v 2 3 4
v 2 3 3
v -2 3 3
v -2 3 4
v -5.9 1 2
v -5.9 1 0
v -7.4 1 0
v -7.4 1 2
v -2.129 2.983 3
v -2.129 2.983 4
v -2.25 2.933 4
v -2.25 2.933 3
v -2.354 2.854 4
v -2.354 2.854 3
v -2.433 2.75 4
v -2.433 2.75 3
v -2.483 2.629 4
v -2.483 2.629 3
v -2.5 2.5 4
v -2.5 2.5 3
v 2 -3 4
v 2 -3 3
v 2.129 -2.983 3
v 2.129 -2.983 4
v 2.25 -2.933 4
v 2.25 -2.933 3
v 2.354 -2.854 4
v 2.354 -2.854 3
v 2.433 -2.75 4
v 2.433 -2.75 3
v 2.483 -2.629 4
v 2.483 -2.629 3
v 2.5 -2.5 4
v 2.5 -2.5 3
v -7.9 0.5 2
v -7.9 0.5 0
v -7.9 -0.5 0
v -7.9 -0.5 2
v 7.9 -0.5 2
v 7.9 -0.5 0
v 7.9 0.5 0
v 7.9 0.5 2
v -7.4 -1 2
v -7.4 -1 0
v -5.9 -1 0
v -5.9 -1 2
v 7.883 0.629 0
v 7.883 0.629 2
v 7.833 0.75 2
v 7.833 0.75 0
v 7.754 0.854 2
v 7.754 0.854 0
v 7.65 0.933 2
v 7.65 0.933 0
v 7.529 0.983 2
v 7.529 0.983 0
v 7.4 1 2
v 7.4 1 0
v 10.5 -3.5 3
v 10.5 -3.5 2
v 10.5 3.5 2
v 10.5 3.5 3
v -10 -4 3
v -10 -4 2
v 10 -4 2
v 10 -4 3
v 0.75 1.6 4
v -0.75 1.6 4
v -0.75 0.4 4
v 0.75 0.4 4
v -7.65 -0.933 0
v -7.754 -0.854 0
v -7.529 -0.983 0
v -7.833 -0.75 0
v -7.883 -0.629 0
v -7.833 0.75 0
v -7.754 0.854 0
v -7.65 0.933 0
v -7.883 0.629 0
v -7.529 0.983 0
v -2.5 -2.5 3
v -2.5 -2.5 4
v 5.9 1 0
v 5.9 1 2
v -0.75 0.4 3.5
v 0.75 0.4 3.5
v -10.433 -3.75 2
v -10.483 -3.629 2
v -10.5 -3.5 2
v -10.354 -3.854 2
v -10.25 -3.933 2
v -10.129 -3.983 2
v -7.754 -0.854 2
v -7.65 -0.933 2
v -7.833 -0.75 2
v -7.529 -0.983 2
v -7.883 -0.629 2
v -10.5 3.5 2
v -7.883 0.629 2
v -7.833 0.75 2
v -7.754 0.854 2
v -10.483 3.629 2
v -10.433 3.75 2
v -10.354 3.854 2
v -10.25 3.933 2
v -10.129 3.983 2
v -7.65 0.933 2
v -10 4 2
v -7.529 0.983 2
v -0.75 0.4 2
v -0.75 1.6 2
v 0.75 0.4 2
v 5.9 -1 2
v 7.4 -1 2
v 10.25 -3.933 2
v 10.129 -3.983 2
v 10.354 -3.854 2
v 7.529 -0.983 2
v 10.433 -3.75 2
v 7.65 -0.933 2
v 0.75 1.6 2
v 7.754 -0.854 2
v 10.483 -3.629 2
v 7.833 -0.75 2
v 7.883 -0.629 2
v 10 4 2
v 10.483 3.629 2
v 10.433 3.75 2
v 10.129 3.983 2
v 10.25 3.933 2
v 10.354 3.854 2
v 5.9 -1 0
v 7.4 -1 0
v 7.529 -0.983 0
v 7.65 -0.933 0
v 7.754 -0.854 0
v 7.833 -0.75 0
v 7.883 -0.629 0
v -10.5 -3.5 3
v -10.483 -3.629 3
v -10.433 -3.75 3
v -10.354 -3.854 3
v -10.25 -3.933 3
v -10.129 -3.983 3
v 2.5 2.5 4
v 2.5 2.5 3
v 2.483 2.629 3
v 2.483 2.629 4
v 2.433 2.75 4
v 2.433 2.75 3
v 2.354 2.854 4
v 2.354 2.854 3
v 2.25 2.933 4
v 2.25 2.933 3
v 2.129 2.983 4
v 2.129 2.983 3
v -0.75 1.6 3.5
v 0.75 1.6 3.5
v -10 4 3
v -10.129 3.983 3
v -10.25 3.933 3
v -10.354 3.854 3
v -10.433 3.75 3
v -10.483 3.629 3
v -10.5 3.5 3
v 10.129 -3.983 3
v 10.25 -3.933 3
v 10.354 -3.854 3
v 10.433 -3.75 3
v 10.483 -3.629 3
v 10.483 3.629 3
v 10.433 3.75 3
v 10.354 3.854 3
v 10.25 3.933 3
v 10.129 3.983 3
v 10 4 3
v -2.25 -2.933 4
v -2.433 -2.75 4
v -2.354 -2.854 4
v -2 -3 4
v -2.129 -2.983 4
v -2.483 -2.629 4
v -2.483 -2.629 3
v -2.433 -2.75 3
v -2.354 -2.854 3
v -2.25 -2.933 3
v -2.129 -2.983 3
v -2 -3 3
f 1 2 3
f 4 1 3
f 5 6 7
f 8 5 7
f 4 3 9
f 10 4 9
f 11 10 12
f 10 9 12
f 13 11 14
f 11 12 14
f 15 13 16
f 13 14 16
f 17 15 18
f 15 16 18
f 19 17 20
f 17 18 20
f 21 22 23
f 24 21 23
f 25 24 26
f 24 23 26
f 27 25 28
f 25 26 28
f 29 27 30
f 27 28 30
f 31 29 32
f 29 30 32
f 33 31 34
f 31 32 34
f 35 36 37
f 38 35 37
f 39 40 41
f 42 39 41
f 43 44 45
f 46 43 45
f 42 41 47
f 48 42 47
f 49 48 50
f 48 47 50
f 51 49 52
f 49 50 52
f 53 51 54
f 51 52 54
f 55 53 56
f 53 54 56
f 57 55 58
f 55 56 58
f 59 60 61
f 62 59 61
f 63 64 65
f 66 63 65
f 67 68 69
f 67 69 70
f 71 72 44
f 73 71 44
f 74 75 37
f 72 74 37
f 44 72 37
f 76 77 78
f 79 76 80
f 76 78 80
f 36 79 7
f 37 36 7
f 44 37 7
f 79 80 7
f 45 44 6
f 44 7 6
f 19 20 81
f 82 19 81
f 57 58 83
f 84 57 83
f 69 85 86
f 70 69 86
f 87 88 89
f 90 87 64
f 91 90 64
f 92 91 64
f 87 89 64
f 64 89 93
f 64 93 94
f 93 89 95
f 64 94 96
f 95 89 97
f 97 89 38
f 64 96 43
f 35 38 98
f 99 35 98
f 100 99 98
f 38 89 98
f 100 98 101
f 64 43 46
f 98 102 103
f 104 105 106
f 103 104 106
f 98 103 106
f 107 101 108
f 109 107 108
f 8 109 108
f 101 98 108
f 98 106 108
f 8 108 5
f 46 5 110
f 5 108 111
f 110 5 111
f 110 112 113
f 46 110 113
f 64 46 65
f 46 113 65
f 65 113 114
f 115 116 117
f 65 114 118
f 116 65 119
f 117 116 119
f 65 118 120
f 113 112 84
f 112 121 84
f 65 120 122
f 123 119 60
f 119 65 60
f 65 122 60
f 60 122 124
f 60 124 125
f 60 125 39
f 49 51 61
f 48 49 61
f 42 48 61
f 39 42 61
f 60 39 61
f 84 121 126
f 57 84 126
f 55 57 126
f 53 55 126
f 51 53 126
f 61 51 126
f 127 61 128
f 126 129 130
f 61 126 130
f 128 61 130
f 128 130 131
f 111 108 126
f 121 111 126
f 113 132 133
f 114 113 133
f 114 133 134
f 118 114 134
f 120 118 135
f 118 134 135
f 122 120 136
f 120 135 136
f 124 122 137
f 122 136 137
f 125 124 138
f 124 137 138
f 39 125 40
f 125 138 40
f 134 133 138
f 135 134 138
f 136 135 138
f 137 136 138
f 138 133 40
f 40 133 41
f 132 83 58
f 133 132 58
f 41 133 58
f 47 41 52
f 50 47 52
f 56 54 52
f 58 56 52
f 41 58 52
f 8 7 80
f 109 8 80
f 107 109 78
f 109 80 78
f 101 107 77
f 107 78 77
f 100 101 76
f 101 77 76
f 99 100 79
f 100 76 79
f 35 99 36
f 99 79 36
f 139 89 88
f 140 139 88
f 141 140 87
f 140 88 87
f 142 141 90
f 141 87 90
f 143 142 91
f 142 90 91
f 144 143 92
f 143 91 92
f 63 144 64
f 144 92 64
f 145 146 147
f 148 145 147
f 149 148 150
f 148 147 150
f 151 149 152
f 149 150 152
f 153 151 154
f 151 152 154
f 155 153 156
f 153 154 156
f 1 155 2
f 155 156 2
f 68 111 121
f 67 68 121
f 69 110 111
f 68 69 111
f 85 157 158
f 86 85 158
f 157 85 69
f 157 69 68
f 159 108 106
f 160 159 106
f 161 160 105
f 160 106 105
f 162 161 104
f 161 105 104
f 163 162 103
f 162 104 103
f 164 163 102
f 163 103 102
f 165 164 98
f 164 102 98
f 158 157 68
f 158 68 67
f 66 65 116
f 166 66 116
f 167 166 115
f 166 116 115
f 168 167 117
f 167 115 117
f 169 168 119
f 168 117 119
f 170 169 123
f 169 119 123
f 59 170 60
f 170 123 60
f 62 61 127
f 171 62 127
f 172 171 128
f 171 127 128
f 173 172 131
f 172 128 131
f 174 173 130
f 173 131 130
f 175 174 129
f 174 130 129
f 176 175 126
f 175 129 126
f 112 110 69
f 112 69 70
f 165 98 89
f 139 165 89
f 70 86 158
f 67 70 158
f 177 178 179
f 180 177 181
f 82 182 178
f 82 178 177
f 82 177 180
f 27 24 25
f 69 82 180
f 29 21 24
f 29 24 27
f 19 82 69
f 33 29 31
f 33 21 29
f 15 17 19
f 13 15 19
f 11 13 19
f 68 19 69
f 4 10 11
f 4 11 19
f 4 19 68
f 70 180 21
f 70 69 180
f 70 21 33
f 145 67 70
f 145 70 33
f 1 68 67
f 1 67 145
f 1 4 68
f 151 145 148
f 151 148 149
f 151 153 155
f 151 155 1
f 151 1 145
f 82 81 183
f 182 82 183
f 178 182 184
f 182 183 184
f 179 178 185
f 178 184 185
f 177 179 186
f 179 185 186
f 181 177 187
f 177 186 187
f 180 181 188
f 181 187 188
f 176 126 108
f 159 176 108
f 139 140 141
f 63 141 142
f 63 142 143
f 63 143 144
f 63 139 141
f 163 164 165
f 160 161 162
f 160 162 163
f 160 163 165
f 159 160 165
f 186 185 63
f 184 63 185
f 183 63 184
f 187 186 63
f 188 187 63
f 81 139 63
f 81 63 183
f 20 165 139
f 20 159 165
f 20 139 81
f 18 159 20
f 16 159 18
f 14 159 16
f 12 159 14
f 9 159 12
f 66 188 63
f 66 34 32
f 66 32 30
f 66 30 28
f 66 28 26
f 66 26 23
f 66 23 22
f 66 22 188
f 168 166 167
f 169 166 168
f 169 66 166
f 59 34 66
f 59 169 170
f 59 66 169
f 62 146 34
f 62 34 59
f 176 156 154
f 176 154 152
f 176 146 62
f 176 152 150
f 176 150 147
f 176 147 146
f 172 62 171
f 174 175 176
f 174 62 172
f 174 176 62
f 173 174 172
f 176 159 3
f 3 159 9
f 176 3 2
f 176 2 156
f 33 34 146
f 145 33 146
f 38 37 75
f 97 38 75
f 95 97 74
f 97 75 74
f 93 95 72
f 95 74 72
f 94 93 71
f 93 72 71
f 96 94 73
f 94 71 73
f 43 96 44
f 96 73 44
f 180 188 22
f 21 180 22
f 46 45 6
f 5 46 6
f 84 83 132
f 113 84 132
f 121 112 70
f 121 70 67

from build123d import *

# Parameters (mm, degrees)
F1_START = 2
F1_DEPTH = 1
F2_DEPTH = 3
F3_START = 2
F0_W     = 1.5
F0_H     = 1.2
F3_DEPTH = 2
F4_START = 3.5
F4_DEPTH = 0.5


# Not quite as in the source:
# - a feature names something its author has since deleted; it is built from what else it names


with BuildPart() as f1:
    # F0 (on Top) → F1 (new body)
    with BuildSketch(Plane.XY.offset(F1_START)):
        with BuildLine():
            Line((10, 4), (-10, 4))
            ThreePointArc((-10, 4), (-10.3535533906, 3.8535533906), (-10.5, 3.5))
            Line((-10.5, 3.5), (-10.5, -3.5))
            ThreePointArc((-10.5, -3.5), (-10.3535533906, -3.8535533906), (-10, -4))
            Line((-10, -4), (10, -4))
            ThreePointArc((10, -4), (10.3535533906, -3.8535533906), (10.5, -3.5))
            Line((10.5, -3.5), (10.5, 3.5))
            ThreePointArc((10.5, 3.5), (10.3535533906, 3.8535533906), (10, 4))
        make_face()
        with BuildLine():
            ThreePointArc((-7.9, 0.5), (-7.7535533906, 0.8535533906), (-7.4, 1))
            Line((-7.4, 1), (-5.9, 1))
            Line((-5.9, 1), (-5.9, -1))
            Line((-5.9, -1), (-7.4, -1))
            ThreePointArc((-7.4, -1), (-7.7535533906, -0.8535533906), (-7.9, -0.5))
            Line((-7.9, -0.5), (-7.9, 0.5))
        make_face(mode=Mode.SUBTRACT)
        with BuildLine():
            Line((-2, 3), (2, 3))
            ThreePointArc((2, 3), (2.3535533906, 2.8535533906), (2.5, 2.5))
            Line((2.5, 2.5), (2.5, -2.5))
            ThreePointArc((2.5, -2.5), (2.3535533906, -2.8535533906), (2, -3))
            Line((2, -3), (-2, -3))
            ThreePointArc((-2, -3), (-2.3535533906, -2.8535533906), (-2.5, -2.5))
            Line((-2.5, -2.5), (-2.5, 2.5))
            ThreePointArc((-2.5, 2.5), (-2.3535533906, 2.8535533906), (-2, 3))
        make_face(mode=Mode.SUBTRACT)
        with BuildLine():
            Line((5.9, -1), (5.9, 1))
            Line((5.9, 1), (7.4, 1))
            ThreePointArc((7.4, 1), (7.7535533906, 0.8535533906), (7.9, 0.5))
            Line((7.9, 0.5), (7.9, -0.5))
            ThreePointArc((7.9, -0.5), (7.7535533906, -0.8535533906), (7.4, -1))
            Line((7.4, -1), (5.9, -1))
        make_face(mode=Mode.SUBTRACT)
    extrude(amount=F1_DEPTH)

    # F0 (on Top) → F2 (join)
    with BuildSketch(Plane.XY):
        with BuildLine():
            Line((-5.9, 1), (-7.4, 1))
            ThreePointArc((-7.4, 1), (-7.7535533906, 0.8535533906), (-7.9, 0.5))
            Line((-7.9, 0.5), (-7.9, -0.5))
            ThreePointArc((-7.9, -0.5), (-7.7535533906, -0.8535533906), (-7.4, -1))
            Line((-7.4, -1), (-5.9, -1))
            Line((-5.9, -1), (-5.9, 1))
        make_face()
        with BuildLine():
            Line((7.4, 1), (5.9, 1))
            Line((5.9, 1), (5.9, -1))
            Line((5.9, -1), (7.4, -1))
            ThreePointArc((7.4, -1), (7.7535533906, -0.8535533906), (7.9, -0.5))
            Line((7.9, -0.5), (7.9, 0.5))
            ThreePointArc((7.9, 0.5), (7.7535533906, 0.8535533906), (7.4, 1))
        make_face()
    extrude(amount=F2_DEPTH)

    # F0 (on Top) → F3 (join)
    with BuildSketch(Plane.XY.offset(F3_START)):
        with BuildLine():
            ThreePointArc((2.5, 2.5), (2.3535533906, 2.8535533906), (2, 3))
            Line((2, 3), (-2, 3))
            ThreePointArc((-2, 3), (-2.3535533906, 2.8535533906), (-2.5, 2.5))
            Line((-2.5, 2.5), (-2.5, -2.5))
            ThreePointArc((-2.5, -2.5), (-2.3535533906, -2.8535533906), (-2, -3))
            Line((-2, -3), (2, -3))
            ThreePointArc((2, -3), (2.3535533906, -2.8535533906), (2.5, -2.5))
            Line((2.5, -2.5), (2.5, 2.5))
        make_face()
        with Locations((0, 1)):
            Rectangle(F0_W, F0_H, mode=Mode.SUBTRACT)
    extrude(amount=F3_DEPTH)


with BuildPart() as f4:
    # F0 (on Top) → F4 (new body)
    with BuildSketch(Plane.XY.offset(F4_START)):
        with Locations((0, 1)):
            Rectangle(F0_W, F0_H)
    extrude(amount=F4_DEPTH)


solid = Compound([f1.part, f4.part])
